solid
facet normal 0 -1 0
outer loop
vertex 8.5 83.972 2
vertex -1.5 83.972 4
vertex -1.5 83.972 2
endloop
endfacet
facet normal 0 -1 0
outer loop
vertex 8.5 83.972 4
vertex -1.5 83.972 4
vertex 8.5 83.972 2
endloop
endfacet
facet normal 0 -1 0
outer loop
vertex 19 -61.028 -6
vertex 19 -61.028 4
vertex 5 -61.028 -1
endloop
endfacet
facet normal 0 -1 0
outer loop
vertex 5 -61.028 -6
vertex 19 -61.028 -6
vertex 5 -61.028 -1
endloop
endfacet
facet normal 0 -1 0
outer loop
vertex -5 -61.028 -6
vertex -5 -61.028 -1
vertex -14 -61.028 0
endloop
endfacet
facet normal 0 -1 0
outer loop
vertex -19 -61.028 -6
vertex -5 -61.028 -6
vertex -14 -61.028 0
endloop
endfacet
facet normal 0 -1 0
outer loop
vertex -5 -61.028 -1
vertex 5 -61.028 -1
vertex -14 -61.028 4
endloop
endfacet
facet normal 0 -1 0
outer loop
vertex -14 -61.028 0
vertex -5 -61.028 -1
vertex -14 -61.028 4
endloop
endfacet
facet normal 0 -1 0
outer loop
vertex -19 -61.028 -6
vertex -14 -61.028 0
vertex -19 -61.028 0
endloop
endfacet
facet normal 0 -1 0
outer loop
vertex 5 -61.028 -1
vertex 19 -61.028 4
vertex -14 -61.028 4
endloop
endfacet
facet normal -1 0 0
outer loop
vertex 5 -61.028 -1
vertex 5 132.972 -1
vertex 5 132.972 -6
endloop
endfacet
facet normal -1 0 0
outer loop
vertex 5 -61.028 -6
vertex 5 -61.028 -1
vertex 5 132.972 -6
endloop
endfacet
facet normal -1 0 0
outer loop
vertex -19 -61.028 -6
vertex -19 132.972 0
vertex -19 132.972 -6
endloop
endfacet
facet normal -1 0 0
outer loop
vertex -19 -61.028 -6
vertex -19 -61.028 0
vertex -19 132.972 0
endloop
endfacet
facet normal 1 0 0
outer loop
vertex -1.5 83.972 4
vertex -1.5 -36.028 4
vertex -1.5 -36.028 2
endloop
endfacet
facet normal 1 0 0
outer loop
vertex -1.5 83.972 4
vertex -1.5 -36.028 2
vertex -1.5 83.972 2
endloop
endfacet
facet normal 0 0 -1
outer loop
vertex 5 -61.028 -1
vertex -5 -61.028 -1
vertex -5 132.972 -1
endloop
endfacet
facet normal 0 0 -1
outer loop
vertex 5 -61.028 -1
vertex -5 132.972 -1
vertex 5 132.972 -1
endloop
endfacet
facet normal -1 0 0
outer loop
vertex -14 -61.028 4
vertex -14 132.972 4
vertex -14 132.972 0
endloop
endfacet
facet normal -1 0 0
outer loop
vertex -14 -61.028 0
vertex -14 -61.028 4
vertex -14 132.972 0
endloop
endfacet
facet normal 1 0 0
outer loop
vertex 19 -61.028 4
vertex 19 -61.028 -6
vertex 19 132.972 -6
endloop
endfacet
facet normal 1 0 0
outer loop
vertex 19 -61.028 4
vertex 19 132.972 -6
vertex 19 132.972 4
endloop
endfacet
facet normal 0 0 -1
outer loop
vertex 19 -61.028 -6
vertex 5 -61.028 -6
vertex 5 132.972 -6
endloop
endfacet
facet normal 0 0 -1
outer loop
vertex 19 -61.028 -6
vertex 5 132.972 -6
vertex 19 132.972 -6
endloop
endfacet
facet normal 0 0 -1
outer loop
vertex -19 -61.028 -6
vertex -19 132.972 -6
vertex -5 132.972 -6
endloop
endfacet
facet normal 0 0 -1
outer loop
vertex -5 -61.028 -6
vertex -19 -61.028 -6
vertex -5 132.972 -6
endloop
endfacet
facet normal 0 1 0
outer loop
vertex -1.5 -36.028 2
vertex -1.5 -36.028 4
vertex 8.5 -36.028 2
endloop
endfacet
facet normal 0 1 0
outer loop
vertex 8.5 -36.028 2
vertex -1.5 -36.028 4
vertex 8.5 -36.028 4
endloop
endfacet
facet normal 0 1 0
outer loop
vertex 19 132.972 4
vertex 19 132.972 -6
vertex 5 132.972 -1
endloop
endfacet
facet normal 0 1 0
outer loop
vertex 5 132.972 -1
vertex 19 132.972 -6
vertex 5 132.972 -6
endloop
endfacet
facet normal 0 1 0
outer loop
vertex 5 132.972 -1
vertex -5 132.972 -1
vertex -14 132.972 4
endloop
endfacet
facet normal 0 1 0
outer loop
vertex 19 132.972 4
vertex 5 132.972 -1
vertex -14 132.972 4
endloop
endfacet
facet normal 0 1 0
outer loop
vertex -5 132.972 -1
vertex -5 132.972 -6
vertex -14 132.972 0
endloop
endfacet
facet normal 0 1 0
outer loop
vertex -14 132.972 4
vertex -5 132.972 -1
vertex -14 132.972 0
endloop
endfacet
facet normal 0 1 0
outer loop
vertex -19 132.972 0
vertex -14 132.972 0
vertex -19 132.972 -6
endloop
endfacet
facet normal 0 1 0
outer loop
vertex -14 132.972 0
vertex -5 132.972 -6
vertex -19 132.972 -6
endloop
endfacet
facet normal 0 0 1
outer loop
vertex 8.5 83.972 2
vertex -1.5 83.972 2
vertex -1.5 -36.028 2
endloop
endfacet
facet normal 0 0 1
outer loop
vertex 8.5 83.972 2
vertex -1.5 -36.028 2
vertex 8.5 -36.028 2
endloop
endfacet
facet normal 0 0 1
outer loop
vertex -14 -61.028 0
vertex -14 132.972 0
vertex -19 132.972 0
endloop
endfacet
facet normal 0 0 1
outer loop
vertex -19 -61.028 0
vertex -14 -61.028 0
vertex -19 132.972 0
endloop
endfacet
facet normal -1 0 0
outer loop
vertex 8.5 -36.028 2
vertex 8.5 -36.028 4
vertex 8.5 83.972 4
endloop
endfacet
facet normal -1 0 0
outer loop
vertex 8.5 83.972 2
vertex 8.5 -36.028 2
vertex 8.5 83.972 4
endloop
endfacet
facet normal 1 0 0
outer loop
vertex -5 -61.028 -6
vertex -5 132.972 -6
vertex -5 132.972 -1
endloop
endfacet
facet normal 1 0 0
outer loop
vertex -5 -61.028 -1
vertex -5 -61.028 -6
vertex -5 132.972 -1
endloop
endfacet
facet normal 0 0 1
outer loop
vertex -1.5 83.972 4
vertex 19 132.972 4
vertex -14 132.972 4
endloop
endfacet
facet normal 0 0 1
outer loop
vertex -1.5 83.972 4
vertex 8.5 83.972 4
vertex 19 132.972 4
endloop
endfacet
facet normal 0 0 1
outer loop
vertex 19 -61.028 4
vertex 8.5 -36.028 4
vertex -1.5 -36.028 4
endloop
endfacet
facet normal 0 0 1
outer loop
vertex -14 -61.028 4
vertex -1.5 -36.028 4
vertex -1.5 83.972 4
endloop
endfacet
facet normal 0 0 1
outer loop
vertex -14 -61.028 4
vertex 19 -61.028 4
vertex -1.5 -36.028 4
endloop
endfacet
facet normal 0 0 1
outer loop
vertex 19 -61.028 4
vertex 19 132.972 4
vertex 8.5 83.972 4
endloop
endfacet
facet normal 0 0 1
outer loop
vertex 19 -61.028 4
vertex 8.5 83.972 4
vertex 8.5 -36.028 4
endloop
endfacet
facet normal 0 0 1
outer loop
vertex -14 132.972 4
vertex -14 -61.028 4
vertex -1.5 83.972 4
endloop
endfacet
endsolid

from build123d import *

# Parameters (mm, degrees)
SKETCH1_W            = 14
SKETCH1_H            = 100
BOSS_EXTRUDE1_DEPTH  = 2
SKETCH2_W            = 2
SKETCH2_H            = 100
BOSS_EXTRUDE2_DEPTH  = 4
SKETCH3_W            = 2
SKETCH3_H            = 100
BOSS_EXTRUDE4_DEPTH  = 2
SKETCH4_W            = 2
SKETCH4_H            = 100
BOSS_EXTRUDE5_DEPTH  = 2
SKETCH6_W            = 18
SKETCH6_H            = 100
BOSS_EXTRUDE6_DEPTH  = 1
SKETCH7_W            = 3
SKETCH7_H            = 100
CUT_EXTRUDE1_DEPTH   = 1
BOSS_EXTRUDE7_DEPTH  = 50
SKETCH9_W            = 3
SKETCH9_H            = 1
CUT_EXTRUDE2_DEPTH   = 150
SKETCH10_W           = 3
SKETCH10_H           = 1
BOSS_EXTRUDE8_DEPTH  = 150
SKETCH11_W           = 2
SKETCH11_H           = 50
CUT_EXTRUDE3_DEPTH   = 50
SKETCH14_W           = 16
SKETCH14_H           = 30
CUT_EXTRUDE4_DEPTH   = 50
SKETCH15_W           = 10
SKETCH15_H           = 2
BOSS_EXTRUDE9_DEPTH  = 4
SKETCH16_W           = 10
SKETCH16_H           = 8
BOSS_EXTRUDE10_DEPTH = 4
SKETCH21_W           = 10
SKETCH21_H           = 8
CUT_EXTRUDE5_DEPTH   = 4
SKETCH23_W           = 16
SKETCH23_H           = 120
CUT_EXTRUDE7_DEPTH   = 2
SKETCH24_W           = 3
SKETCH24_H           = 40
BOSS_EXTRUDE13_DEPTH = 1
BOSS_EXTRUDE14_DEPTH = 50
SKETCH27_W           = 2
SKETCH27_H           = 170
BOSS_EXTRUDE15_DEPTH = 2
SKETCH28_W           = 5
SKETCH28_H           = 170
BOSS_EXTRUDE16_DEPTH = 18
SKETCH29_W           = 5
SKETCH29_H           = 170
BOSS_EXTRUDE17_DEPTH = 40
SKETCH30_W           = 1
SKETCH30_H           = 170
BOSS_EXTRUDE18_DEPTH = 1
SKETCH31_W           = 1
SKETCH31_H           = 170
BOSS_EXTRUDE19_DEPTH = 1
SKETCH32_W           = 10
SKETCH32_H           = 170
CUT_EXTRUDE8_DEPTH   = 2
SKETCH33_W           = 40
SKETCH33_H           = 4
BOSS_EXTRUDE20_DEPTH = 1
SKETCH34_W           = 10
SKETCH34_H           = 40
BOSS_EXTRUDE21_DEPTH = 2
SKETCH35_W           = 3
SKETCH35_H           = 170
CUT_EXTRUDE9_DEPTH   = 1
SKETCH36_W           = 1
SKETCH36_H           = 170
BOSS_EXTRUDE22_DEPTH = 1
SKETCH37_W           = 1
SKETCH37_H           = 170
CUT_EXTRUDE10_DEPTH  = 2
SKETCH39_W           = 6
SKETCH39_H           = 170
CUT_EXTRUDE11_DEPTH  = 4
SKETCH40_W           = 10
SKETCH40_H           = 129
BOSS_EXTRUDE23_DEPTH = 2
SKETCH41_W           = 10
SKETCH41_H           = 120
CUT_EXTRUDE12_DEPTH  = 2
BOSS_EXTRUDE24_DEPTH = 30
CUT_EXTRUDE13_DEPTH  = 30
SKETCH45_W           = 10
SKETCH45_H           = 120
CUT_EXTRUDE14_DEPTH  = 2
SKETCH46_W           = 10
SKETCH46_H           = 20
BOSS_EXTRUDE25_DEPTH = 2
SKETCH47_W           = 10
SKETCH47_H           = 5
BOSS_EXTRUDE26_DEPTH = 2
SKETCH48_W           = 10
SKETCH48_H           = 5
CUT_EXTRUDE15_DEPTH  = 2
SKETCH52_W           = 10
SKETCH52_H           = 120
BOSS_EXTRUDE27_DEPTH = 2
SKETCH53_W           = 10
SKETCH53_H           = 120
CUT_EXTRUDE16_DEPTH  = 2
SKETCH54_W           = 15
SKETCH54_H           = 170
BOSS_EXTRUDE28_DEPTH = 5
SKETCH55_W           = 1
SKETCH55_H           = 170
CUT_EXTRUDE17_DEPTH  = 1
SKETCH56_W           = 1
SKETCH56_H           = 170
CUT_EXTRUDE18_DEPTH  = 10
SKETCH57_W           = 1
SKETCH57_H           = 170
CUT_EXTRUDE19_DEPTH  = 11
BOSS_EXTRUDE29_DEPTH = 14
CUT_EXTRUDE20_DEPTH  = 14
BOSS_EXTRUDE30_DEPTH = 14
BOSS_EXTRUDE31_DEPTH = 10


with BuildPart() as part:
    # Sketch1 → Boss-Extrude1 (new body)
    with BuildSketch(Plane.XY):
        with Locations((-7, 38.971731826)):
            Rectangle(SKETCH1_W, SKETCH1_H)
    extrude(amount=BOSS_EXTRUDE1_DEPTH)

    # Sketch2 → Boss-Extrude2 (add)
    with BuildSketch(Plane.XY.offset(2)):
        with Locations((-13, 38.971731826)):
            Rectangle(SKETCH2_W, SKETCH2_H)
        with Locations((-1, 38.971731826)):
            Rectangle(SKETCH2_W, SKETCH2_H)
    extrude(amount=BOSS_EXTRUDE2_DEPTH)

    # Sketch3 → Boss-Extrude4 (add)
    with BuildSketch(Plane(origin=(0, 0, 0), x_dir=(0, 0, -1), z_dir=(1, 0, 0))):
        with Locations((-1, 38.971731826)):
            Rectangle(SKETCH3_W, SKETCH3_H)
    extrude(amount=BOSS_EXTRUDE4_DEPTH)

    # Sketch4 → Boss-Extrude5 (add)
    with BuildSketch(Plane.ZY.offset(14)):
        with Locations((1, 38.971731826)):
            Rectangle(SKETCH4_W, SKETCH4_H)
    extrude(amount=BOSS_EXTRUDE5_DEPTH)

    # Sketch6 → Boss-Extrude6 (add)
    with BuildSketch(Plane(origin=(0, 0, 0), x_dir=(-1, 0, 0), z_dir=(0, 0, -1))):
        with Locations((7, 38.971731826)):
            Rectangle(SKETCH6_W, SKETCH6_H)
    extrude(amount=BOSS_EXTRUDE6_DEPTH)

    # Sketch7 → Cut-Extrude1 (cut)
    with BuildSketch(Plane(origin=(0, 0, -1), x_dir=(-1, 0, 0), z_dir=(0, 0, -1))):
        with Locations((7, 38.971731826)):
            Rectangle(SKETCH7_W, SKETCH7_H)
    extrude(amount=-CUT_EXTRUDE1_DEPTH, mode=Mode.SUBTRACT)

    # Sketch8 → Boss-Extrude7 (add)
    with BuildSketch(Plane(origin=(0, 88.971731826, 0), x_dir=(1, 0, 0), z_dir=(0, 1, 0))):
        Polygon((2, 1), (-5.5, 1), (-5.5, 0), (-8.5, 0), (-8.5, 1), (-16, 1), (-16, -2), (-14, -2), (-14, -6), (-12, -6), (-12, -2), (-2, -2), (-2, -6), (0, -6), (0, -2), (2, -2), align=None)
    extrude(amount=BOSS_EXTRUDE7_DEPTH)

    # Sketch9 → Cut-Extrude2 (cut)
    with BuildSketch(Plane(origin=(0, 138.971731826, 0), x_dir=(1, 0, 0), z_dir=(0, 1, 0))):
        with Locations((-10, 0.5)):
            Rectangle(SKETCH9_W, SKETCH9_H)
    extrude(amount=-CUT_EXTRUDE2_DEPTH, mode=Mode.SUBTRACT)

    # Sketch10 → Boss-Extrude8 (add)
    with BuildSketch(Plane(origin=(0, 138.971731826, 0), x_dir=(1, 0, 0), z_dir=(0, 1, 0))):
        with Locations((-7, 0.5)):
            Rectangle(SKETCH10_W, SKETCH10_H)
    extrude(amount=-BOSS_EXTRUDE8_DEPTH)

    # Sketch11 → Cut-Extrude3 (cut)
    with BuildSketch(Plane.XY.offset(2)):
        with Locations((-15, 13.971731826)):
            Rectangle(SKETCH11_W, SKETCH11_H)
    extrude(amount=-CUT_EXTRUDE3_DEPTH, mode=Mode.SUBTRACT)

    # Sketch14 → Cut-Extrude4 (cut)
    with BuildSketch(Plane.XY.offset(6)):
        with Locations((-6, 3.971731826)):
            Rectangle(SKETCH14_W, SKETCH14_H)
    extrude(amount=-CUT_EXTRUDE4_DEPTH, mode=Mode.SUBTRACT)

    # Sketch15 → Boss-Extrude9 (add)
    with BuildSketch(Plane.XY.offset(2)):
        with Locations((-7, 137.971731826)):
            Rectangle(SKETCH15_W, SKETCH15_H)
    extrude(amount=BOSS_EXTRUDE9_DEPTH)

    # Sketch16 → Boss-Extrude10 (add)
    with BuildSketch(Plane.XY.offset(2)):
        with Locations((-7, 132.971731826)):
            Rectangle(SKETCH16_W, SKETCH16_H)
    extrude(amount=BOSS_EXTRUDE10_DEPTH)

    # Sketch21 → Cut-Extrude5 (cut)
    with BuildSketch(Plane.XY.offset(6)):
        with Locations((-7, 132.971731826)):
            Rectangle(SKETCH21_W, SKETCH21_H)
    extrude(amount=-CUT_EXTRUDE5_DEPTH, mode=Mode.SUBTRACT)

    # Sketch23 → Cut-Extrude7 (cut)
    with BuildSketch(Plane.XY.offset(6)):
        with Locations((-6, 78.971731826)):
            Rectangle(SKETCH23_W, SKETCH23_H)
    extrude(amount=-CUT_EXTRUDE7_DEPTH, mode=Mode.SUBTRACT)

    # Sketch24 → Boss-Extrude13 (add)
    with BuildSketch(Plane(origin=(0, 0, 0), x_dir=(-1, 0, 0), z_dir=(0, 0, -1))):
        with Locations((10, 118.971731826)):
            Rectangle(SKETCH24_W, SKETCH24_H)
    extrude(amount=BOSS_EXTRUDE13_DEPTH)

    # Sketch26 → Boss-Extrude14 (add)
    with BuildSketch(Plane.XZ.offset(-18.971731826)):
        Polygon((-14, 4), (-12, 4), (-12, 2), (-2, 2), (-2, 4), (0, 4), (0, 2), (2, 2), (2, -1), (-8.5, -1), (-8.5, 0), (-11.5, 0), (-11.5, -1), (-14, -1), align=None)
    extrude(amount=BOSS_EXTRUDE14_DEPTH)

    # Sketch27 → Boss-Extrude15 (add, through all)
    with BuildSketch(Plane(origin=(0, 0, 0), x_dir=(0, 0, -1), z_dir=(1, 0, 0))):
        with Locations((-3, 53.971731826)):
            Rectangle(SKETCH27_W, SKETCH27_H)
    extrude(amount=BOSS_EXTRUDE15_DEPTH)

    # Sketch28 → Boss-Extrude16 (add)
    with BuildSketch(Plane(origin=(2, 0, 0), x_dir=(0, 0, -1), z_dir=(1, 0, 0))):
        with Locations((-1.5, 53.971731826)):
            Rectangle(SKETCH28_W, SKETCH28_H)
    extrude(amount=BOSS_EXTRUDE16_DEPTH)

    # Sketch29 → Boss-Extrude17 (add)
    with BuildSketch(Plane(origin=(20, 0, 0), x_dir=(0, 0, -1), z_dir=(1, 0, 0))):
        with Locations((-1.5, 53.971731826)):
            Rectangle(SKETCH29_W, SKETCH29_H)
    extrude(amount=-BOSS_EXTRUDE17_DEPTH)

    # Sketch30 → Boss-Extrude18 (add)
    with BuildSketch(Plane.ZY.offset(20)):
        with Locations((3.5, 53.971731826)):
            Rectangle(SKETCH30_W, SKETCH30_H)
    extrude(amount=BOSS_EXTRUDE18_DEPTH)

    # Sketch31 → Boss-Extrude19 (add)
    with BuildSketch(Plane(origin=(20, 0, 0), x_dir=(0, 0, -1), z_dir=(1, 0, 0))):
        with Locations((-3.5, 53.971731826)):
            Rectangle(SKETCH31_W, SKETCH31_H)
    extrude(amount=BOSS_EXTRUDE19_DEPTH)

    # Sketch32 → Cut-Extrude8 (cut)
    with BuildSketch(Plane(origin=(0, 0, -1), x_dir=(-1, 0, 0), z_dir=(0, 0, -1))):
        with Locations((0, 53.971731826)):
            Rectangle(SKETCH32_W, SKETCH32_H)
    extrude(amount=-CUT_EXTRUDE8_DEPTH, mode=Mode.SUBTRACT)

    # Sketch33 → Boss-Extrude20 (add)
    with BuildSketch(Plane(origin=(0, 138.971731826, 0), x_dir=(1, 0, 0), z_dir=(0, 1, 0))):
        with Locations((0, -1)):
            Rectangle(SKETCH33_W, SKETCH33_H)
    extrude(amount=-BOSS_EXTRUDE20_DEPTH)

    # Sketch34 → Boss-Extrude21 (add, through all)
    with BuildSketch(Plane(origin=(0, 0, 1), x_dir=(-1, 0, 0), z_dir=(0, 0, -1))):
        with Locations((0, -11.028268174)):
            Rectangle(SKETCH34_W, SKETCH34_H)
    extrude(amount=BOSS_EXTRUDE21_DEPTH)

    # Sketch35 → Cut-Extrude9 (cut)
    with BuildSketch(Plane.XY.offset(4)):
        with Locations((-18, 53.971731826)):
            Rectangle(SKETCH35_W, SKETCH35_H)
    extrude(amount=-CUT_EXTRUDE9_DEPTH, mode=Mode.SUBTRACT)

    # Sketch36 → Boss-Extrude22 (add)
    with BuildSketch(Plane.ZY.offset(20)):
        with Locations((-0.5, 53.971731826)):
            Rectangle(SKETCH36_W, SKETCH36_H)
    extrude(amount=BOSS_EXTRUDE22_DEPTH)

    # Sketch37 → Cut-Extrude10 (cut, through all)
    with BuildSketch(Plane(origin=(0, 0, 3), x_dir=(-1, 0, 0), z_dir=(0, 0, -1))):
        with Locations((20.5, 53.971731826)):
            Rectangle(SKETCH37_W, SKETCH37_H)
    extrude(amount=-CUT_EXTRUDE10_DEPTH, mode=Mode.SUBTRACT)

    # Sketch39 → Cut-Extrude11 (cut)
    with BuildSketch(Plane.XY.offset(4)):
        with Locations((-17, 53.971731826)):
            Rectangle(SKETCH39_W, SKETCH39_H)
    extrude(amount=-CUT_EXTRUDE11_DEPTH, mode=Mode.SUBTRACT)

    # Sketch40 → Boss-Extrude23 (add, through all)
    with BuildSketch(Plane(origin=(0, 0, 1), x_dir=(-1, 0, 0), z_dir=(0, 0, -1))):
        with Locations((0, 73.471731826)):
            Rectangle(SKETCH40_W, SKETCH40_H)
    extrude(amount=BOSS_EXTRUDE23_DEPTH)

    # Sketch41 → Cut-Extrude12 (cut)
    with BuildSketch(Plane.XY.offset(4)):
        with Locations((0, 38.971731826)):
            Rectangle(SKETCH41_W, SKETCH41_H)
    extrude(amount=-CUT_EXTRUDE12_DEPTH, mode=Mode.SUBTRACT)

    # Sketch43 → Boss-Extrude24 (add)
    with BuildSketch(Plane.XZ.offset(31.028268174)):
        Polygon((-21, -1), (-21, 0), (-14, 0), (-14, 4), (21, 4), (21, 3), (20, 3), (20, -1), align=None)
    extrude(amount=BOSS_EXTRUDE24_DEPTH)

    # Sketch44 → Cut-Extrude13 (cut)
    with BuildSketch(Plane(origin=(0, 138.971731826, 0), x_dir=(1, 0, 0), z_dir=(0, 1, 0))):
        Polygon((-21, 1), (20, 1), (20, -3), (21, -3), (21, -4), (-14, -4), (-14, 0), (-21, 0), align=None)
    extrude(amount=-CUT_EXTRUDE13_DEPTH, mode=Mode.SUBTRACT)

    # Sketch45 → Cut-Extrude14 (cut)
    with BuildSketch(Plane.XY.offset(4)):
        with Locations((0, 18.971731826)):
            Rectangle(SKETCH45_W, SKETCH45_H)
    extrude(amount=-CUT_EXTRUDE14_DEPTH, mode=Mode.SUBTRACT)

    # Sketch46 → Boss-Extrude25 (add)
    with BuildSketch(Plane.XY.offset(4)):
        with Locations((0, 88.971731826)):
            Rectangle(SKETCH46_W, SKETCH46_H)
    extrude(amount=-BOSS_EXTRUDE25_DEPTH)

    # Sketch47 → Boss-Extrude26 (add)
    with BuildSketch(Plane.XY.offset(4)):
        with Locations((0, -38.528268174)):
            Rectangle(SKETCH47_W, SKETCH47_H)
    extrude(amount=-BOSS_EXTRUDE26_DEPTH)

    # Sketch48 → Cut-Extrude15 (cut)
    with BuildSketch(Plane.XY.offset(4)):
        with Locations((0, 81.471731826)):
            Rectangle(SKETCH48_W, SKETCH48_H)
    extrude(amount=-CUT_EXTRUDE15_DEPTH, mode=Mode.SUBTRACT)

    # Sketch52 → Boss-Extrude27 (add)
    with BuildSketch(Plane.XY.offset(4)):
        with Locations((0, 23.971731826)):
            Rectangle(SKETCH52_W, SKETCH52_H)
    extrude(amount=-BOSS_EXTRUDE27_DEPTH)

    # Sketch53 → Cut-Extrude16 (cut)
    with BuildSketch(Plane.XY.offset(4)):
        with Locations((3.5, 23.971731826)):
            Rectangle(SKETCH53_W, SKETCH53_H)
    extrude(amount=-CUT_EXTRUDE16_DEPTH, mode=Mode.SUBTRACT)

    # Sketch54 → Boss-Extrude28 (add)
    with BuildSketch(Plane(origin=(0, 0, -1), x_dir=(-1, 0, 0), z_dir=(0, 0, -1))):
        with Locations((-12.5, 23.971731826)):
            Rectangle(SKETCH54_W, SKETCH54_H)
        with Locations((12.5, 23.971731826)):
            Rectangle(SKETCH54_W, SKETCH54_H)
    extrude(amount=BOSS_EXTRUDE28_DEPTH)

    # Sketch55 → Cut-Extrude17 (cut)
    with BuildSketch(Plane(origin=(0, 0, -1), x_dir=(-1, 0, 0), z_dir=(0, 0, -1))):
        with Locations((20.5, 23.971731826)):
            Rectangle(SKETCH55_W, SKETCH55_H)
    extrude(amount=-CUT_EXTRUDE17_DEPTH, mode=Mode.SUBTRACT)

    # Sketch56 → Cut-Extrude18 (cut)
    with BuildSketch(Plane(origin=(0, 0, 3), x_dir=(-1, 0, 0), z_dir=(0, 0, -1))):
        with Locations((-20.5, 23.971731826)):
            Rectangle(SKETCH56_W, SKETCH56_H)
    extrude(amount=-CUT_EXTRUDE18_DEPTH, mode=Mode.SUBTRACT)

    # Sketch57 → Cut-Extrude19 (cut, through all)
    with BuildSketch(Plane.XY.offset(4)):
        with Locations((19.5, 23.971731826)):
            Rectangle(SKETCH57_W, SKETCH57_H)
        with Locations((-19.5, 23.971731826)):
            Rectangle(SKETCH57_W, SKETCH57_H)
    extrude(amount=-CUT_EXTRUDE19_DEPTH, mode=Mode.SUBTRACT)

    # Sketch58 → Boss-Extrude29 (add)
    with BuildSketch(Plane.XZ.offset(61.028268174)):
        Polygon((-19, -6), (-5, -6), (-5, -1), (5, -1), (5, -6), (19, -6), (19, 4), (-14, 4), (-14, 0), (-19, 0), align=None)
    extrude(amount=BOSS_EXTRUDE29_DEPTH)

    # Sketch59 → Cut-Extrude20 (cut)
    with BuildSketch(Plane.XZ.offset(75.028268174)):
        Polygon((-19, -6), (-19, 0), (-14, 0), (-14, 4), (19, 4), (19, -6), (5, -6), (5, -1), (-5, -1), (-5, -6), align=None)
    extrude(amount=-CUT_EXTRUDE20_DEPTH, mode=Mode.SUBTRACT)

    # Sketch60 → Boss-Extrude30 (add)
    with BuildSketch(Plane(origin=(0, 108.971731826, 0), x_dir=(1, 0, 0), z_dir=(0, 1, 0))):
        Polygon((-19, 6), (-5, 6), (-5, 1), (5, 1), (5, 6), (19, 6), (19, -4), (-14, -4), (-14, 0), (-19, 0), align=None)
    extrude(amount=BOSS_EXTRUDE30_DEPTH)

    # Sketch61 → Boss-Extrude31 (add)
    with BuildSketch(Plane(origin=(0, 122.971731826, 0), x_dir=(1, 0, 0), z_dir=(0, 1, 0))):
        Polygon((-19, 6), (-5, 6), (-5, 1), (5, 1), (5, 6), (19, 6), (19, -4), (-14, -4), (-14, 0), (-19, 0), align=None)
    extrude(amount=BOSS_EXTRUDE31_DEPTH)


solid = part.part
